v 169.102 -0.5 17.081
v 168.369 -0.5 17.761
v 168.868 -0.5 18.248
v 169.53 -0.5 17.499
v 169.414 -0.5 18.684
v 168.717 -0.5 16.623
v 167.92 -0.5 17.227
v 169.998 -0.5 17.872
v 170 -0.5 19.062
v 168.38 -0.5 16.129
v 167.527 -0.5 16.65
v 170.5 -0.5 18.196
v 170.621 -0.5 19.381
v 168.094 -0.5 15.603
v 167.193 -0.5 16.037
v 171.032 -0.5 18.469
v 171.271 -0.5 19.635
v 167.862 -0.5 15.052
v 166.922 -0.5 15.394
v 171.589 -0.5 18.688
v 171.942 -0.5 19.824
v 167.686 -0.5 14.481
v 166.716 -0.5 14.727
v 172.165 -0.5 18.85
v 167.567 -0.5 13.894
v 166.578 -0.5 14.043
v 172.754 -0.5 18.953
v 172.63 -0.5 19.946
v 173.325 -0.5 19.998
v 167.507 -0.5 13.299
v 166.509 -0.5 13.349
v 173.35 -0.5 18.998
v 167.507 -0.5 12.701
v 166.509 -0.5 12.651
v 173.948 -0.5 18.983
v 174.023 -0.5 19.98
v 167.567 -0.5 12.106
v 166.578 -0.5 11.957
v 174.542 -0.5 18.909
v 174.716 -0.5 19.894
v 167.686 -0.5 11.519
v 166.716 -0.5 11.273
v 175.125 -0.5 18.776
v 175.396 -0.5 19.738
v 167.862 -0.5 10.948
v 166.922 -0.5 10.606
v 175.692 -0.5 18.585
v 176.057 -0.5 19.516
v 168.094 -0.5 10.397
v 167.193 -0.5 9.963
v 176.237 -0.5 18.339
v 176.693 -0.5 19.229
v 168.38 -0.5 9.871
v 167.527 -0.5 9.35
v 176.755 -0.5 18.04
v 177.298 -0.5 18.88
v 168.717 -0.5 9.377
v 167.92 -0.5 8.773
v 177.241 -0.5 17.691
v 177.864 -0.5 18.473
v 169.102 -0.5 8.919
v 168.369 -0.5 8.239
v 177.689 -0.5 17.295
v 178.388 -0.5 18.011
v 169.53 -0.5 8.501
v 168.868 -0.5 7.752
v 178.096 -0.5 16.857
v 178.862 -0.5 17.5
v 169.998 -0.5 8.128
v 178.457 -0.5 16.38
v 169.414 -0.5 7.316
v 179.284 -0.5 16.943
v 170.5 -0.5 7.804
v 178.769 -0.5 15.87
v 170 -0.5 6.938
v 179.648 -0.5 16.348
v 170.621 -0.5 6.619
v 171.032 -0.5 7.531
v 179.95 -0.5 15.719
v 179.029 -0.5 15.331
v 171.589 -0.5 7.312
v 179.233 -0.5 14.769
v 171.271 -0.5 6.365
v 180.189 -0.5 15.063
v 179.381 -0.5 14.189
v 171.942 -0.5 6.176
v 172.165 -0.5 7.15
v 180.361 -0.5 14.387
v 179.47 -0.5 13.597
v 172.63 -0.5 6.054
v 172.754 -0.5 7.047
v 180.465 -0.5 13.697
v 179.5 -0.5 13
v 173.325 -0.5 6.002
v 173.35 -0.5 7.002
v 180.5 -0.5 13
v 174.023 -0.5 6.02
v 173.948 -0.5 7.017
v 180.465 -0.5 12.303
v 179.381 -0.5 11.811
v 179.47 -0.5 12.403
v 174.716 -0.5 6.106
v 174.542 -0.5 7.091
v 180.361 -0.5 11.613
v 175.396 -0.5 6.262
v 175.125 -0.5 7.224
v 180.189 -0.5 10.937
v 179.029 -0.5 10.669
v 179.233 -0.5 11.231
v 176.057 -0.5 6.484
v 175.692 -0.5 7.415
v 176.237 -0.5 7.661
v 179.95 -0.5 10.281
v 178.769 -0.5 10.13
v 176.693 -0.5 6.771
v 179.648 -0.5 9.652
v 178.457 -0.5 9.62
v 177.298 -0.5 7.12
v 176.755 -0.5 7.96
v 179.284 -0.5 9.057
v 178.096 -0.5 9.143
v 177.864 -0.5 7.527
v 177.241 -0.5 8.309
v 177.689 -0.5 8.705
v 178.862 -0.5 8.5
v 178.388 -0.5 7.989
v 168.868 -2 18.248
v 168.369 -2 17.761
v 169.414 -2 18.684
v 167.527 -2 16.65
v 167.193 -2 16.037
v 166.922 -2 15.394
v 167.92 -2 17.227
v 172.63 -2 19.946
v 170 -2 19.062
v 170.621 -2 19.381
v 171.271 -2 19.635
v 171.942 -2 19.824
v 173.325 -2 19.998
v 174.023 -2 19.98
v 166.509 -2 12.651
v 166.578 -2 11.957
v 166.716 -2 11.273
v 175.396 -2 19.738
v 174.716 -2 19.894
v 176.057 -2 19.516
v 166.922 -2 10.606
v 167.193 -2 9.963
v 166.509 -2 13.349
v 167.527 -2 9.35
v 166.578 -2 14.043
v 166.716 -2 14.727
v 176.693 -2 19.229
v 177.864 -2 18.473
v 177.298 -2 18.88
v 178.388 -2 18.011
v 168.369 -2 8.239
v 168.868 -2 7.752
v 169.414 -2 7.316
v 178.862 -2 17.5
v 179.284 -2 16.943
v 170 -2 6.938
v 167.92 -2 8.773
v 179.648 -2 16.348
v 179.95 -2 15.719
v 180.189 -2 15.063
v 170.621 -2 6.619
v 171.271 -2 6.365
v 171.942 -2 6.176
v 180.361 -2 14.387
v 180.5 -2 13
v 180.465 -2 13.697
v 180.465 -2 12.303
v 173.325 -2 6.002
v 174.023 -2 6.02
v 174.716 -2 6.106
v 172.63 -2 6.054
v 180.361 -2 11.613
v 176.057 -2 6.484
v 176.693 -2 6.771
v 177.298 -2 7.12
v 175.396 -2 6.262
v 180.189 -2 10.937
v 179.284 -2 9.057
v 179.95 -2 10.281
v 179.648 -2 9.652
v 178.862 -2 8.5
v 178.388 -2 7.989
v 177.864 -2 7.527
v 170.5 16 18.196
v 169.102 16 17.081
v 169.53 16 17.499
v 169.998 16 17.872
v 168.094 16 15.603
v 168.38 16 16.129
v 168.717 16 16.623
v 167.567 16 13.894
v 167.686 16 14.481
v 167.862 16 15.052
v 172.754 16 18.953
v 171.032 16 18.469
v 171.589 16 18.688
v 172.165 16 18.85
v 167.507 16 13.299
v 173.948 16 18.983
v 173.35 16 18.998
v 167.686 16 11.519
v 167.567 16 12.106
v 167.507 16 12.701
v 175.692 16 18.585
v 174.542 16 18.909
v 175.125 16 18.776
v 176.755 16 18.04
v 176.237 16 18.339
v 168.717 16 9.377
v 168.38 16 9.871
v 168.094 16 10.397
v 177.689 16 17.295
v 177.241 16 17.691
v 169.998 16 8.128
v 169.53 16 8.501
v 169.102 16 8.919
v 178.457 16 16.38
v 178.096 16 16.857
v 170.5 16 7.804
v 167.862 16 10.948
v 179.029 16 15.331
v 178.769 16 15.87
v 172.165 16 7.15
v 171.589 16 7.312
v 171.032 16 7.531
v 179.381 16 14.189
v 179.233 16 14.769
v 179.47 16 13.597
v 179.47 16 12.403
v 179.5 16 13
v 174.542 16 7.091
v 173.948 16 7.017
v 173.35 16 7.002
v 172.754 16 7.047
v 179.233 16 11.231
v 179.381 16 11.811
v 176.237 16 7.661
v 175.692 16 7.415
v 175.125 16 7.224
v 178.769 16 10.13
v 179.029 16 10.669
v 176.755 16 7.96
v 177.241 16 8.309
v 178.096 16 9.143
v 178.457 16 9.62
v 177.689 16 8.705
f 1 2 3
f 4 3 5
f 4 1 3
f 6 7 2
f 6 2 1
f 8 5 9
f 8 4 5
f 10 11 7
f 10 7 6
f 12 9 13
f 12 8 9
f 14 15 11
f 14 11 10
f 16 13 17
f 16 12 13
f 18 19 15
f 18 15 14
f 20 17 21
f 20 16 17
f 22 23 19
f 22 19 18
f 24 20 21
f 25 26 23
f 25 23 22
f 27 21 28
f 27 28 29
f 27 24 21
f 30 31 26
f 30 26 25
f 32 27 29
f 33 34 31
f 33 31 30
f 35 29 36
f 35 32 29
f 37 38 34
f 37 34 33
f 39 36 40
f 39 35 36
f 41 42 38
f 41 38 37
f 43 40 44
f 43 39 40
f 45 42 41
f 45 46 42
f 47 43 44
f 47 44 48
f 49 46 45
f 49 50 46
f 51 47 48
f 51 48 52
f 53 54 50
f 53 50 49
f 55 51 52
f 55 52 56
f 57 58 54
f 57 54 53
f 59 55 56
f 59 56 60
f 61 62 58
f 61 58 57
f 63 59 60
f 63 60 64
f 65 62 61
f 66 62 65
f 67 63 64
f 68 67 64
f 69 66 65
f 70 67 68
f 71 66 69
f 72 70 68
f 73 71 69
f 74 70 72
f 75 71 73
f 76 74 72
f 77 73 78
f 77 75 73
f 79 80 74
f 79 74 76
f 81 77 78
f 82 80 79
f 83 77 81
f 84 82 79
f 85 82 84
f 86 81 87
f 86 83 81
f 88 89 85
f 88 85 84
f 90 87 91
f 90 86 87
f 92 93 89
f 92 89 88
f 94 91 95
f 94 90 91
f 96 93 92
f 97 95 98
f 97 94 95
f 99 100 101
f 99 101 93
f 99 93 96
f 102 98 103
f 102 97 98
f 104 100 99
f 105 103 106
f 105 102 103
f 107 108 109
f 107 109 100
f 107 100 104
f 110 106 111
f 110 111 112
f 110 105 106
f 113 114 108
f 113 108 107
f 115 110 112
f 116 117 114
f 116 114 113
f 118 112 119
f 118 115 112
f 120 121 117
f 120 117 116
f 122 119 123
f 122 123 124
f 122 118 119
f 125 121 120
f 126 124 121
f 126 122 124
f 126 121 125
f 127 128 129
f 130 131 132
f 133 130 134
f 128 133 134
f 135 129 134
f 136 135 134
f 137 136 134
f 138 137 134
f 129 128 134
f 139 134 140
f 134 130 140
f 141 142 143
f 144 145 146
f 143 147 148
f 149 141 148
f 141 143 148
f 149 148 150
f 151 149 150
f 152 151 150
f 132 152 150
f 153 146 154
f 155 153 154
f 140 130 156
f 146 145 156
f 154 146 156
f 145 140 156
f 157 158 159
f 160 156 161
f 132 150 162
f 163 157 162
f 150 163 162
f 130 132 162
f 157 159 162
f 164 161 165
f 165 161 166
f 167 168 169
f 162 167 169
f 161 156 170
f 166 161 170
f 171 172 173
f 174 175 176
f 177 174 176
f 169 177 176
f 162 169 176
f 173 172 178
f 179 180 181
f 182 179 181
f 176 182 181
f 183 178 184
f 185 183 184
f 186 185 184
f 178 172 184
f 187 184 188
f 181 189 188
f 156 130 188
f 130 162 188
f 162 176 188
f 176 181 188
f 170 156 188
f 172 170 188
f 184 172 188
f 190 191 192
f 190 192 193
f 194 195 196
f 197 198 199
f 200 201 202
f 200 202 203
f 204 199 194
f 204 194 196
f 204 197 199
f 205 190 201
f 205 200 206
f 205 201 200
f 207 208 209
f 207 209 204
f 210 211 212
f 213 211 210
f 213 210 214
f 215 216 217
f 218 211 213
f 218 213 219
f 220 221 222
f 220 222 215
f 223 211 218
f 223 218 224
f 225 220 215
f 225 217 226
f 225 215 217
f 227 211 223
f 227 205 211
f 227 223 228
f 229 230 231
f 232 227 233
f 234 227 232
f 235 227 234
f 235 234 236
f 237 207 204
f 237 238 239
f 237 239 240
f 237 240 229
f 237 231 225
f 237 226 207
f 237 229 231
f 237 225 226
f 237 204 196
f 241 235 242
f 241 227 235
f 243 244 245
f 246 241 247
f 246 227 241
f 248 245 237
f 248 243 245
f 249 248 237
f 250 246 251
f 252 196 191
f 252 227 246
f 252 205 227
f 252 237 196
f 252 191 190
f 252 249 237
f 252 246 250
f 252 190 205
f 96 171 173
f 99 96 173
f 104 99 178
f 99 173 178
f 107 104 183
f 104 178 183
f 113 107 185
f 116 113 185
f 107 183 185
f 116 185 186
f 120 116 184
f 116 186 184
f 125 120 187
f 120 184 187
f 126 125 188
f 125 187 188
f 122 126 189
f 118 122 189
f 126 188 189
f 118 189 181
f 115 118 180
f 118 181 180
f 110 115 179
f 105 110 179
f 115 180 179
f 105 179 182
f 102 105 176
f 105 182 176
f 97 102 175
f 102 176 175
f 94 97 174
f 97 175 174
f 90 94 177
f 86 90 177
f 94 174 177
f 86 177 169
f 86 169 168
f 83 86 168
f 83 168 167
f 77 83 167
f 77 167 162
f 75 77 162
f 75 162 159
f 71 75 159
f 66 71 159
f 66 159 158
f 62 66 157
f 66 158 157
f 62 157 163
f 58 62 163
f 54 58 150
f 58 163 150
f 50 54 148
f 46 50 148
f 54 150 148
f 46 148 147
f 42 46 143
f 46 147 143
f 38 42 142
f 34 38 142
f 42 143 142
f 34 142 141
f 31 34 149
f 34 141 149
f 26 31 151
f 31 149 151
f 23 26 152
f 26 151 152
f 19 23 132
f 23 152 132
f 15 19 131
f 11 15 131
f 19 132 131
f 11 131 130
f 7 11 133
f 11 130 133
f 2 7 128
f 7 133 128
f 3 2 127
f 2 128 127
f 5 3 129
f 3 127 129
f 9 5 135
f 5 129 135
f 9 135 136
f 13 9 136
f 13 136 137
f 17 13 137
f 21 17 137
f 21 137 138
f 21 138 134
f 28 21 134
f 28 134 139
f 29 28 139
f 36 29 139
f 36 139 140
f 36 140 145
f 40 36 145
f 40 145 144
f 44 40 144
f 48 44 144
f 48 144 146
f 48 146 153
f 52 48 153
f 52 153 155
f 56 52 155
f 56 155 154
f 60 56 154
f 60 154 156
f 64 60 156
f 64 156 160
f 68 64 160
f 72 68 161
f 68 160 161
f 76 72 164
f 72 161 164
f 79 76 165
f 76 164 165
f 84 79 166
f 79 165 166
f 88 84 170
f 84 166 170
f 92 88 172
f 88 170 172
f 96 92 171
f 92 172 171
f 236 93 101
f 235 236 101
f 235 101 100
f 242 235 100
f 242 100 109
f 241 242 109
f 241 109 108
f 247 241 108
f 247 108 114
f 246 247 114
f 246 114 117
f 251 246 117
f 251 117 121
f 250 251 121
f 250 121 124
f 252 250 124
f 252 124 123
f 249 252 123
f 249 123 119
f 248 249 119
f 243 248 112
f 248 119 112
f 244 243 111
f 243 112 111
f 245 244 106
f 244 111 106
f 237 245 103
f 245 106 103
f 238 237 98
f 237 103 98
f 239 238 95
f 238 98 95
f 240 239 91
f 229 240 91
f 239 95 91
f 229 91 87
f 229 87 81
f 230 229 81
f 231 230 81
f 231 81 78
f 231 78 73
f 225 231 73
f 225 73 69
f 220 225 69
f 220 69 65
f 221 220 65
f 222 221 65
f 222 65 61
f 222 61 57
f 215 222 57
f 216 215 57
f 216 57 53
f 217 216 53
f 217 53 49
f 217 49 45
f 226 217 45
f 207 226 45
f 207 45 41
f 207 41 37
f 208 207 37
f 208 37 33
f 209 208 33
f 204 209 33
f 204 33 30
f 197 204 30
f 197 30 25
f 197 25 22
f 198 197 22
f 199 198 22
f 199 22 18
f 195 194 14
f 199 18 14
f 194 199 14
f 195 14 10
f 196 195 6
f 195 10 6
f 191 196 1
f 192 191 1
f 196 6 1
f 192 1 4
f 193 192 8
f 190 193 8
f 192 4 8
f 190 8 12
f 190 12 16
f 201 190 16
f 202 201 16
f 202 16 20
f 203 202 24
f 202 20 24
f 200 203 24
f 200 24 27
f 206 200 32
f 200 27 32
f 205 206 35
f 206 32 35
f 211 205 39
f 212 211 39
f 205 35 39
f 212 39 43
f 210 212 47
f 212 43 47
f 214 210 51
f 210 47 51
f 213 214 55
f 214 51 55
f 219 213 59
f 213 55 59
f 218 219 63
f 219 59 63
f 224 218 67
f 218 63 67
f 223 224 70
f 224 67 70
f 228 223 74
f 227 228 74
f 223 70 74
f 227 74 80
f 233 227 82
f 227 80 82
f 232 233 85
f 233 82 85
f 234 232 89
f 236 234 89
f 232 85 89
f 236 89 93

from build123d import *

# Parameters (mm, degrees)
CYLINDER004_R          = 7
CYLINDER004_DEPTH      = 1.5
CYLINDER003_R          = 6
CYLINDER003_DEPTH      = 18
FUSION_PLACEMENT_ANGLE = 270


with BuildPart() as cylinder004:
    # Cylinder004 → Cylinder004 (new body)
    with BuildSketch(Plane.XY):
        Circle(CYLINDER004_R)
    extrude(amount=CYLINDER004_DEPTH)


with BuildPart() as dc_jack:
    # Cylinder003 → Cylinder003 (new body)
    with BuildSketch(Plane.XY):
        Circle(CYLINDER003_R)
    extrude(amount=CYLINDER003_DEPTH)

    # Fusion: union Cylinder004
    add(cylinder004.part)


with BuildPart() as dc_jack_1:
    # Fusion placement: moved
    add(dc_jack.part.moved(Location((173.5, -2, 13))).rotate(Axis((173.5, -2, 13), (1, 0, 0)), FUSION_PLACEMENT_ANGLE))


solid = dc_jack_1.part
